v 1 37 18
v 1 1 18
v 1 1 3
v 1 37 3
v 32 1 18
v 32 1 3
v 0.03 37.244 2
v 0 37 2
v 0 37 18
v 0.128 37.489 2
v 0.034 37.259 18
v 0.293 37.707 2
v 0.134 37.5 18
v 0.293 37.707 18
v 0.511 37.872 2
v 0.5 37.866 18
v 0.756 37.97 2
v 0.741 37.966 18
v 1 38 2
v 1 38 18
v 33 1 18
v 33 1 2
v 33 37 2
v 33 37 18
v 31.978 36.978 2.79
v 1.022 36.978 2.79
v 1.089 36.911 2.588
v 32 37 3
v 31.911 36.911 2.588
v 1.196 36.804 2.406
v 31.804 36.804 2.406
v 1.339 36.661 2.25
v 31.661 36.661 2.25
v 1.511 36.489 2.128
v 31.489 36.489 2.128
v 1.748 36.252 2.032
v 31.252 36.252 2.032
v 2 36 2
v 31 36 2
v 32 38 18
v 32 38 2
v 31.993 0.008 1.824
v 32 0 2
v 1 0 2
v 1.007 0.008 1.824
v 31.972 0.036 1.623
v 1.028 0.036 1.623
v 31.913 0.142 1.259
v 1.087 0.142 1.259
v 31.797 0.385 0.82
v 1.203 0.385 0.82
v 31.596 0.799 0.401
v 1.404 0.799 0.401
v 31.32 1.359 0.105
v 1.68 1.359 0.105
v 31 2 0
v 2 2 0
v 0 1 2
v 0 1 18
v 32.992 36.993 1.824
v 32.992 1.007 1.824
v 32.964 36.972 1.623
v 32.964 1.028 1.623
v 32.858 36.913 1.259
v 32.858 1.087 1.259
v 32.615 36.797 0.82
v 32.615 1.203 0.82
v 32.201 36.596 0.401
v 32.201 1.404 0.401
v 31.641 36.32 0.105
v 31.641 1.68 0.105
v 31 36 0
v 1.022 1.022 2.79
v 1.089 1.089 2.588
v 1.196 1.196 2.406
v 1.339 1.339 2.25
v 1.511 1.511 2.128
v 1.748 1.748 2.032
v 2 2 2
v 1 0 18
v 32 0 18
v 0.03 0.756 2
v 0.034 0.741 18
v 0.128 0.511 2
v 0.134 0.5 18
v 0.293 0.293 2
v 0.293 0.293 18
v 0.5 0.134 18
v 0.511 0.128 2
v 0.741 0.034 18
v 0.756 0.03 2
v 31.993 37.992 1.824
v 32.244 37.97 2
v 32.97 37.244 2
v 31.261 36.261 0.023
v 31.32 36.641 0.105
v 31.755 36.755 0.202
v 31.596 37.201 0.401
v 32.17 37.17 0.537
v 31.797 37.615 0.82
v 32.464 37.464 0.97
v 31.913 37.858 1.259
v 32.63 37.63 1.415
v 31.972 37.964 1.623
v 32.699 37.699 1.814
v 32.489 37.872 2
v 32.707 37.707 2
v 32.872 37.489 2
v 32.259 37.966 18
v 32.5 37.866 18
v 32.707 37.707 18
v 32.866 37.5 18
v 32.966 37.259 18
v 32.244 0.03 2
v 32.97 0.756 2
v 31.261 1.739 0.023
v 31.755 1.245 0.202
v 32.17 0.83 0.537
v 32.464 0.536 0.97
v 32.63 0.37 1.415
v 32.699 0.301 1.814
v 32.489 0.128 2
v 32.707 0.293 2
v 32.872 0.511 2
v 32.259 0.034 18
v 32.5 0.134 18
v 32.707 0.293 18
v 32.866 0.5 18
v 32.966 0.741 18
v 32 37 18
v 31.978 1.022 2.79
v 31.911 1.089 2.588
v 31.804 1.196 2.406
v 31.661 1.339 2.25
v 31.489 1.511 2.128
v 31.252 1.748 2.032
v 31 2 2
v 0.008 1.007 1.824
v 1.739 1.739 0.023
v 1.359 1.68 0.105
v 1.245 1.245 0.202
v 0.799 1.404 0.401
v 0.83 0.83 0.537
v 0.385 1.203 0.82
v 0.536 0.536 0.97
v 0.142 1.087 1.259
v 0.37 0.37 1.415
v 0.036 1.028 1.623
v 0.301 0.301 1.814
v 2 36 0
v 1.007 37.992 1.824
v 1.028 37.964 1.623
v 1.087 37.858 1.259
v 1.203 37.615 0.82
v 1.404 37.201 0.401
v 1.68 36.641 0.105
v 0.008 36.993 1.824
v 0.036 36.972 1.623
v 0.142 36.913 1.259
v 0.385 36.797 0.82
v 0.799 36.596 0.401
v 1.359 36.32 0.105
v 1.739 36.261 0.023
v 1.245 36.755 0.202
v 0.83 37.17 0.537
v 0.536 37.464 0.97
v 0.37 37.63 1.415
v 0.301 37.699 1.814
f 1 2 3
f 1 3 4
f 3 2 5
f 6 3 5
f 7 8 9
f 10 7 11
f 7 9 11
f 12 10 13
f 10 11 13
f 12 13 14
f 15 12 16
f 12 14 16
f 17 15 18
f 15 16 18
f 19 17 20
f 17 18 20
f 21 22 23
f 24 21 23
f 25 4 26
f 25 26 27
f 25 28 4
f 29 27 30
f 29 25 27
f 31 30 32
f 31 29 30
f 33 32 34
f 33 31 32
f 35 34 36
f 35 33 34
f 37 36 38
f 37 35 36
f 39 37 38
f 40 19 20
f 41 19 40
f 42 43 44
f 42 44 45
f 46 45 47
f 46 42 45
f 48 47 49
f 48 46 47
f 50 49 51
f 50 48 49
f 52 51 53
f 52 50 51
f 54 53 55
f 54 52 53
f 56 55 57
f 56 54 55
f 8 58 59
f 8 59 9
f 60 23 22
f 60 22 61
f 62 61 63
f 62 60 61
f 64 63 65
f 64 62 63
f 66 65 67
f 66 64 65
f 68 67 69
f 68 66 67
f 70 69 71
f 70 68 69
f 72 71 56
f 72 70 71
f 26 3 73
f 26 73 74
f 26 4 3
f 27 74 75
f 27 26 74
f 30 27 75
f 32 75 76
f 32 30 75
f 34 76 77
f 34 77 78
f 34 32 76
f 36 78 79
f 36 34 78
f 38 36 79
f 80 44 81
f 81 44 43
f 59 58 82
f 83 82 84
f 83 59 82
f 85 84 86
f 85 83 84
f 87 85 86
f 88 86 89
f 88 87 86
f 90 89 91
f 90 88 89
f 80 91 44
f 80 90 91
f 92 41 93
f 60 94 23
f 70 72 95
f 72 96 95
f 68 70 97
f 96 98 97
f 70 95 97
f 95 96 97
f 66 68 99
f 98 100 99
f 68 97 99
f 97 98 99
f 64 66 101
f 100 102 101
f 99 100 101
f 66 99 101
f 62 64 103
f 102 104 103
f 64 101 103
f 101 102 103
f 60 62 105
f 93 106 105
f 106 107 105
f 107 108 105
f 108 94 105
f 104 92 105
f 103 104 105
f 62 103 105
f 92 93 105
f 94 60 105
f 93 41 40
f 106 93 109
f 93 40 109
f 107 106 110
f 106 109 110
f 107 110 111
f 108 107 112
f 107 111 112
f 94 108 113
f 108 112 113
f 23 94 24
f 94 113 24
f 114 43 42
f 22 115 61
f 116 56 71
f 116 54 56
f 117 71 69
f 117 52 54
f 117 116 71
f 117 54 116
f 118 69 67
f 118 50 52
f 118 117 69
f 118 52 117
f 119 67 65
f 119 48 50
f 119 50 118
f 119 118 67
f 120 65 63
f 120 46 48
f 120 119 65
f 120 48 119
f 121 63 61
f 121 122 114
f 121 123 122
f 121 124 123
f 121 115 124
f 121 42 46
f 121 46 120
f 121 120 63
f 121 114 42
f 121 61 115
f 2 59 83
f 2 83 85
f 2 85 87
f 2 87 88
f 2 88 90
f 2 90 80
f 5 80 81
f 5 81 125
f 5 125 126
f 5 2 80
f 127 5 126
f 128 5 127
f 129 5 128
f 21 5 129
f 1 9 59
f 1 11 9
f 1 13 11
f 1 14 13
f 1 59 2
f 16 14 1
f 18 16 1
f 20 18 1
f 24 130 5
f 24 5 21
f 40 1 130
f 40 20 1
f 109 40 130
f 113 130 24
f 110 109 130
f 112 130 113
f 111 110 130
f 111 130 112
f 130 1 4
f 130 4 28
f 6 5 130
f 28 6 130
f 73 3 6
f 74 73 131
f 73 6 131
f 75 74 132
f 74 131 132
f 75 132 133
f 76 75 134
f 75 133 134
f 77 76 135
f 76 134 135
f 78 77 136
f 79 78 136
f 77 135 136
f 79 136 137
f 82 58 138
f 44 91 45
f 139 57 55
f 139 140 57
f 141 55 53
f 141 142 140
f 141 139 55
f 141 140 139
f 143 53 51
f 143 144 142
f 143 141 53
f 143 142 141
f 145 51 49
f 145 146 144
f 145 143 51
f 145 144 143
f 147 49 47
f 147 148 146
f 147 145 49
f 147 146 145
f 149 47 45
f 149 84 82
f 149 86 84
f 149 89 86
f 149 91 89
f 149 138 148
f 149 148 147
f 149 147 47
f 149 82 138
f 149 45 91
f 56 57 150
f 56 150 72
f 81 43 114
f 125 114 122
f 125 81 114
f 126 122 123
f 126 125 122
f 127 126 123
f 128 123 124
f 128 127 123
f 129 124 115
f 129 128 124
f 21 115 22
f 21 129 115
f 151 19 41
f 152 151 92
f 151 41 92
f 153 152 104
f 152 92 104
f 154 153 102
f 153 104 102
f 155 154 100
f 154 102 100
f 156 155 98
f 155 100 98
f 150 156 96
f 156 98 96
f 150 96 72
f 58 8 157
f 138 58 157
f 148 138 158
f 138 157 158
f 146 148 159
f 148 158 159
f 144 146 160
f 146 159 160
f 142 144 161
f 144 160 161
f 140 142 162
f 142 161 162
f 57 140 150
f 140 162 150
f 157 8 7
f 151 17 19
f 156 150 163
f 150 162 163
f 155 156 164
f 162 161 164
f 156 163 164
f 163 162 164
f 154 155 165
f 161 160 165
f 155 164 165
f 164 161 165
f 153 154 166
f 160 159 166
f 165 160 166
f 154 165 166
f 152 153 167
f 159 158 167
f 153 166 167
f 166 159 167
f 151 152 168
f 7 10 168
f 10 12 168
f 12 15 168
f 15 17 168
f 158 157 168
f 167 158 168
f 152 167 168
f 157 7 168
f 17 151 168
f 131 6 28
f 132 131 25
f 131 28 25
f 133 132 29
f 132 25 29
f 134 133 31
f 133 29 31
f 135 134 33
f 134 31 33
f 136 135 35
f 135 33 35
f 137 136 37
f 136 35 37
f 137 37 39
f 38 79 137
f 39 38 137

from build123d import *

# Parameters (mm, degrees)
SKETCH001_W      = 31
SKETCH001_H      = 36
EXTRUDE002_DEPTH = 16
SKETCH_W         = 33
SKETCH_H         = 38
EXTRUDE_DEPTH    = 18
FILLET_R         = 1
FILLET001_R      = 2
FILLET002_R      = 1


with BuildPart() as inside:
    # Sketch001 (on Face6 of Extrude) → Extrude002 (new body)
    with BuildSketch(Plane.XY.offset(18)):
        with Locations((16.5, 19)):
            Rectangle(SKETCH001_W, SKETCH001_H)
    extrude(amount=-EXTRUDE002_DEPTH)


with BuildPart() as body:
    # Sketch → Extrude (new body)
    with BuildSketch(Plane.XY):
        with Locations((16.5, 19)):
            Rectangle(SKETCH_W, SKETCH_H)
    extrude(amount=EXTRUDE_DEPTH)

    # Cut: cut Inside
    add(inside.part, mode=Mode.SUBTRACT)

    # Fillet
    fillet_edges = [body.edges().sort_by_distance(p)[0] for p in [
        (16.5, 37, 2),
        (32, 19, 2),
        (1, 19, 2),
        (16.5, 1, 2),
    ]]
    fillet(fillet_edges, radius=FILLET_R)

    # Fillet001
    fillet001_edges = [body.edges().sort_by_distance(p)[0] for p in [
        (0, 19, 0),
        (16.5, 0, 0),
        (16.5, 38, 0),
        (33, 19, 0),
    ]]
    fillet(fillet001_edges, radius=FILLET001_R)

    # Fillet002
    fillet002_edges = [body.edges().sort_by_distance(p)[0] for p in [
        (33, 38, 10),
        (33, 0, 10),
        (0, 0, 10),
        (0, 38, 10),
    ]]
    fillet(fillet002_edges, radius=FILLET002_R)


solid = body.part
